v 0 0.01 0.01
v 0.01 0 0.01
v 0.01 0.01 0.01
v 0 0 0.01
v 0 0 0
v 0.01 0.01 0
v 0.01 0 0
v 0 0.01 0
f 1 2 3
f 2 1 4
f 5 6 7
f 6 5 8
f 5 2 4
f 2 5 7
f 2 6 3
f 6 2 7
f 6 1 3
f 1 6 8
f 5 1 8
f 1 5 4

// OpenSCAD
// file: ../../src/common/common_params.scad
/***
 * @module Common Parameters
 * @brief Shared constants and tolerances used by the CurveGears implementation.
 *
 * Historical constants are retained for numerical compatibility.
 */
_cg_pi = 3.14159;
_cg_deg_per_rad = 57.29578;
_cg_tolerance = 1e-7;
_cg_default_fn = 50;
_cg_circle_pi = 3.141592653589793;

/**
 * @module _cg_assert_samples
 * @brief Validate a sampled-curve count while preserving the caller diagnostic.
 * @param samples {integer >= minimum} Requested sample count.
 * @param message {string} Caller-specific diagnostic message.
 * @param minimum {integer, default 120} Minimum supported sample count.
 */
module _cg_assert_samples(samples,message="samples must be an integer >= 120",minimum=120) {
    assert(samples >= minimum && floor(samples)==samples,message);
}
// file: ../../src/common/mate/motion.scad
/***
 * @module Mate motion
 * @brief Shared phase interpolation for mathematically conjugate mates.
 *
 * Family files own radius and pitch-point equations. This file owns the
 * shared midpoint integration, closure solve, direct mate-point construction
 * and phase interpretation used by every dynamically conjugate family.
 *
 * The fixed-centre conjugate pitch relation is `r2=D-r1` with rolling law
 * `dphi/dtheta=r1/(D-r1)`. Shape-driven families provide `r1(theta)` or an
 * adapted closed pitch curve; a future motion-driven adapter may instead
 * derive both radii from a displacement law before entering this same core.
 * These equations define pitch geometry, not exact tooth-flank geometry.
 */
include <../common_math.scad>

/***
 * @function _cg_motion_values_from_mid_radii
 * @brief Integrate one revolution from midpoint radii at a candidate centre distance.
 * @param mid_radii {array} Driver radii sampled at integration midpoints.
 * @param D {number > 0} Candidate centre distance in mm.
 * @return {array} Incremental mate-angle values in degrees.
 */
function _cg_motion_values_from_mid_radii(mid_radii,D) =
    [for(i=[0:len(mid_radii)-1])
        let(step=360/len(mid_radii),r=mid_radii[i]) step*r/(D-r)];

/**
 * @function _cg_motion_integration_state
 * @brief Build the shared incremental values, cumulative angles and motion table once.
 * @param driver_radii {array of number} Driver radii at output angles, or `undef`.
 * @param mid_radii {array of number} Driver radii at interval midpoints.
 * @param D {number > 0} Centre distance in mm.
 * @return {array} `[values, cumulative, motion]` integration state.
 */
function _cg_motion_integration_state(driver_radii,mid_radii,D) =
    let(values=_cg_motion_values_from_mid_radii(mid_radii,D),cumulative=_cg_prefix_sums(values),n=is_undef(driver_radii) ? len(mid_radii) : len(driver_radii))
    [values,cumulative,[for(i=[0:n]) [360*i/n,cumulative[i]]]];

/***
 * @function _cg_motion_table_from_mid_radii
 * @brief Build a phase-to-phase motion table from midpoint radii.
 * @param mid_radii {array} Driver radii sampled at integration midpoints.
 * @param D {number > 0} Centre distance in mm.
 * @return {array} Table of `[driver phase, mate phase]` pairs in degrees.
 */
function _cg_motion_table_from_mid_radii(mid_radii,D) =
    _cg_motion_integration_state(undef,mid_radii,D)[2];

/***
 * @function _cg_motion_closure_error_from_mid_radii
 * @brief Return the one-turn closure error for midpoint-radius integration.
 * @param mid_radii {array} Driver radii sampled at integration midpoints.
 * @param D {number > 0} Candidate centre distance in mm.
 * @return {number} Closure error in degrees.
 */
function _cg_motion_closure_error_from_mid_radii(mid_radii,D) =
    let(state=_cg_motion_integration_state(undef,mid_radii,D)) state[1][len(state[1])-1]-360;

/**
 * @function _cg_motion_table_from_radius_samples
 * @brief Integrate the rolling law at driver-angle samples.
 * @param driver_radii {array of number} Driver radii at output angles.
 * @param mid_radii {array of number} Driver radii at interval midpoints.
 * @param D {number > 0} Centre distance in mm.
 * @return {array} Table of `[driver phase, mate phase]` pairs in degrees.
 *
 * The midpoint radii are used only for integration.  The table is therefore
 * an output of the direct driver-angle integration, not an inverse-motion
 * reconstruction of the mate.
 */
function _cg_motion_table_from_radius_samples(driver_radii,mid_radii,D) =
    _cg_motion_integration_state(driver_radii,mid_radii,D)[2];

/***
 * @function _cg_solve_mate_distance
 * @brief Solve the centre distance whose integrated mate motion closes after one turn.
 * @param mid_radii {array} Driver radii sampled at integration midpoints.
 * @param lo {number > 0} Lower centre-distance bracket in mm.
 * @param hi {number > 0} Upper centre-distance bracket in mm.
 * @param i {integer, default 0} Recursive bisection iteration.
 * @return {number} Solved centre distance in mm.
 */
function _cg_solve_mate_distance(mid_radii,lo,hi,i=0) =
    i>=36 ? (lo+hi)/2 :
    let(mid=(lo+hi)/2,e=_cg_motion_closure_error_from_mid_radii(mid_radii,mid))
        e>0 ? _cg_solve_mate_distance(mid_radii,mid,hi,i+1)
        : _cg_solve_mate_distance(mid_radii,lo,mid,i+1);

/**
 * @function _cg_mate_points_from_radius_samples
 * @brief Construct mate pitch points directly while advancing driver angle.
 * @param driver_radii {array of number} Driver radii at output angles.
 * @param mid_radii {array of number} Driver radii at interval midpoints.
 * @param D {number > 0} Centre distance in mm.
 * @return {array of points} Directly generated Cartesian mate pitch points.
 *
 * For each driver sample `theta_i`, the accumulated rolling angle `phi_i`
 * is evaluated first and the mate radius is then `D-driver_radii[i]`. Its
 * local polar angle is `-phi_i`; reversing the sampled order restores the
 * positive winding required by the gear-boundary construction.
 * This is the primary mate-construction path for all radial families.
 */
function _cg_mate_points_from_radius_samples(driver_radii,mid_radii,D) =
    _cg_mate_points_from_radius_samples_with_state(driver_radii,D,_cg_motion_integration_state(driver_radii,mid_radii,D));

/**
 * @function _cg_mate_points_from_radius_samples_with_state
 * @brief Construct mate points from a previously integrated motion state.
 * @param driver_radii {array of number} Driver radii at output angles.
 * @param D {number > 0} Centre distance in mm.
 * @param integration_state {array} State returned by `_cg_motion_integration_state`.
 * @return {array of points} Directly generated Cartesian mate pitch points.
 */
function _cg_mate_points_from_radius_samples_with_state(driver_radii,D,integration_state) =
    let(clockwise=[for(i=[0:len(driver_radii)-1])
        _cg_mate_point_from_radius(driver_radii[i],D,-integration_state[1][i])])
    [for(i=[0:len(clockwise)-1]) clockwise[(len(clockwise)-i)%len(clockwise)]];

/***
 * @function _cg_mate_point_from_radius
 * @brief Map a driver phase and evaluated driver radius to its opposed mate pitch point.
 * @param radius {number > 0} Driver radius in mm.
 * @param D {number > 0} Centre distance in mm.
 * @param phi {angle} Mate polar angle in degrees.
 * @return {array} Mate Cartesian pitch point in mm.
 */
function _cg_mate_point_from_radius(radius,D,phi) =
    let(mate_radius=D-radius)
    [mate_radius*cos(phi),mate_radius*sin(phi)];

/***
 * @function _cg_motion_y_unwrapped
 * @brief Return the continuous mate angle for a driver angle from a motion table.
 * @param tab {array} Table of `[driver phase, mate phase]` pairs.
 * @param angle {angle} Driver phase in degrees.
 * @return {angle} Continuous mate phase in degrees.
 */
function _cg_motion_y_unwrapped(tab,angle) =
    let(turns=floor(angle/360),wrapped=angle-360*turns)
    360*turns + _cg_interp_y_for_x(tab,wrapped);

/***
 * @function _cg_mate_rotation_for_phase
 * @brief Convert driver body rotation into the conjugate mate body rotation.
 * @param tab {array} Table of `[driver phase, mate phase]` pairs.
 * @param phase {angle} Driver phase in degrees.
 * @return {angle} Mate display rotation in degrees.
 */
function _cg_mate_rotation_for_phase(tab,phase) = 180 + _cg_motion_y_unwrapped(tab,-phase);

/**
 * @function _cg_motion_closure_error
 * @brief Return the final accumulated mate-angle error in degrees.
 * @param motion {motion table} Shared driver-to-mate motion table.
 * @return {number} Difference between the final mate angle and one turn.
 */
function _cg_motion_closure_error(motion) = motion[len(motion)-1][1]-360;
// file: ../../src/common/mate/preparation.scad
/***
 * @module Mate preparation
 * @brief Prepare conjugate pitch geometry from explicitly sampled physical radii.
 *
 * Families own their radius laws, sampling and distance bounds. This layer
 * composes the existing solver and integration once per invocation.
 */
include <motion.scad>

/**
 * @function _cg_mate_radii_valid
 * @brief Check finite positive physical radii without building geometry.
 * @param radii {array of number} Boundary or midpoint radii in millimetres.
 * @return {boolean} True for at least three finite positive radii.
 */
function _cg_mate_radii_valid(radii) = len(radii)>=3
    && min([for(r=radii) is_num(r) && r>0 && r<1e100 ? 1 : 0])==1;

/**
 * @function _cg_mate_distance_from_radii
 * @brief Solve the existing rolling equation after checking its physical bracket.
 * @param mid_radii {array of number} Physical radii at integration midpoints.
 * @param lower {number or function} Lower distance bound strictly above the midpoint radii.
 * @param upper {number} Upper distance bound enclosing one-turn closure.
 * @return {number} Solved centre distance in millimetres.
 */
function _cg_mate_distance_from_radii(mid_radii,lower,upper) =
    let(bound=is_function(lower) ? lower(mid_radii) : lower)
    assert(_cg_mate_radii_valid(mid_radii),"mate_preparation: midpoint radii must be finite and positive")
    assert(is_num(bound) && is_num(upper) && bound>max(mid_radii) && upper>bound && upper<1e100,
        "mate_preparation: distance bounds must be finite and outside the driver")
    assert(_cg_motion_closure_error_from_mid_radii(mid_radii,bound)>=0
        && _cg_motion_closure_error_from_mid_radii(mid_radii,upper)<=0,
        "mate_preparation: distance bounds must bracket one-turn closure")
    _cg_solve_mate_distance(mid_radii,bound,upper);

/**
 * @function _cg_mate_preparation
 * @brief Share distance, motion integration and conjugate pitch construction.
 * @param driver_radii {array of number} Radii at output angle boundaries.
 * @param mid_radii {array of number} Radii at the corresponding interval midpoints.
 * @param lower {number, function or undef} Family-selected lower solver bound.
 * @param upper {number or undef} Family-selected upper solver bound.
 * @param distance {number or undef} Optional already solved centre distance.
 * @return {array} `[distance, motion table, mate pitch points]`, consumed by shared geometry operators.
 */
function _cg_mate_preparation(driver_radii,mid_radii,lower=undef,upper=undef,distance=undef) =
    assert(len(driver_radii)==len(mid_radii) && _cg_mate_radii_valid(driver_radii) && _cg_mate_radii_valid(mid_radii),
        "mate_preparation: boundary and midpoint radii must be finite, positive and equally sized")
    let(D=is_undef(distance) ? _cg_mate_distance_from_radii(mid_radii,lower,upper) : distance)
    assert(is_num(D) && D<1e100 && D>max(concat(driver_radii,mid_radii)),
        "mate_preparation: centre distance must exceed all driver radii")
    let(state=_cg_motion_integration_state(driver_radii,mid_radii,D))
    [D,state[2],_cg_mate_points_from_radius_samples_with_state(driver_radii,D,state)];

/**
 * @function _cg_polar_mate_distance
 * @brief Solve one named shape's physical centre distance without building unused geometry.
 * @param shape {array} `[driver points, radius function, lower bound, upper bound, radial root]`.
 * @param n {integer >= 3} Number of motion intervals.
 * @return {number} Centre distance in millimetres.
 */
function _cg_polar_mate_distance(shape,n) =
    _cg_mate_distance_from_radii(_cg_sample_polar_radii(shape[1],n,true),shape[2],shape[3]);

/**
 * @function _cg_polar_mate_rotation
 * @brief Solve distance and integrated rolling motion for a named shape and phase.
 * @param shape {array} Physical shape and bound descriptor.
 * @param n {integer >= 3} Number of motion intervals.
 * @param phase {angle} Unwrapped driver phase in degrees.
 * @return {angle} Mate display rotation in degrees.
 */
function _cg_polar_mate_rotation(shape,n,phase) =
    let(mid=_cg_sample_polar_radii(shape[1],n,true),D=_cg_mate_distance_from_radii(mid,shape[2],shape[3]),motion=_cg_motion_table_from_mid_radii(mid,D))
    _cg_mate_rotation_for_phase(motion,phase);
// main file
/***
 * @function mate_preparation
 * @brief Prove rolling closure, complementary radii, tangent conjugacy and shared preparation consistency.
 * Source: [`mate/preparation.scad`](mate/preparation.scad)
 */
include <../../src/common/mate/preparation.scad>

n=240;
for(amplitude=[0,2]) {
    driver=[for(i=[0:n-1]) 10+amplitude*cos(360*i/n)];
    mid=[for(i=[0:n-1]) 10+amplitude*cos(360*(i+.5)/n)];
    prepared=_cg_mate_preparation(driver,mid,12.01,40);
    D=prepared[0];
    motion=prepared[1];
    mate=prepared[2];
    assert(abs(_cg_motion_closure_error(motion))<1e-6,"prepared rolling closure failed");
    assert(max([for(i=[0:n-1]) abs(driver[i]+sqrt(mate[(n-i)%n][0]*mate[(n-i)%n][0]+mate[(n-i)%n][1]*mate[(n-i)%n][1])-D)])<1e-10,
        "prepared complementary radius failed");
    for(i=[0:n-1])
        assert(abs(motion[i+1][1]-motion[i][1]-(360/n)*mid[i]/(D-mid[i]))<1e-10,"rolling increment changed");
    if(amplitude==0) {
        assert(abs(D-20)<1e-8,"circular analytic centre distance changed");
        for(phase=[-360,-15,0,15,43,90,180,270,359,360,735])
            assert(abs(_cg_mate_rotation_for_phase(motion,phase)-(180-phase))<1e-6,"circular multi-turn motion changed");
    }
    assert(_cg_mate_preparation(driver,mid,distance=D)[2]==mate,"pre-solved distance changed points");
}
function _cg_test_rotate_vector(vector,angle) =
    [vector[0]*cos(angle)-vector[1]*sin(angle),vector[0]*sin(angle)+vector[1]*cos(angle)];
function _cg_test_tangent_line_error(a,b) =
    atan2(abs(a[0]*b[1]-a[1]*b[0]),abs(a[0]*b[0]+a[1]*b[1]));

// An asymmetric radial law exercises the sign that a circle cannot expose.
asymmetric_n=240;
asymmetric_radii=[for(i=[0:asymmetric_n-1]) 10+2*sin(360*i/asymmetric_n)+.8*cos(720*i/asymmetric_n+20)];
asymmetric_mid=[for(i=[0:asymmetric_n-1]) 10+2*sin(360*(i+.5)/asymmetric_n)+.8*cos(720*(i+.5)/asymmetric_n+20)];
asymmetric_points=_cg_polar_points_from_radii(asymmetric_radii);
asymmetric_prepared=_cg_mate_preparation(asymmetric_radii,asymmetric_mid,max(asymmetric_mid)+.01,4*max(asymmetric_mid));
asymmetric_mate=asymmetric_prepared[2];
asymmetric_correspondence=[for(i=[0:asymmetric_n-1]) asymmetric_mate[(asymmetric_n-i)%asymmetric_n]];
asymmetric_motion=asymmetric_prepared[1];
asymmetric_tangent_errors=[for(i=[0:asymmetric_n-1])
    let(previous=(i-1+asymmetric_n)%asymmetric_n,next=(i+1)%asymmetric_n,theta=360*i/asymmetric_n,phi=asymmetric_motion[i][1],
        driver_tangent=_cg_test_rotate_vector(_cg_vsub(asymmetric_points[next],asymmetric_points[previous]),-theta),
        mate_tangent=_cg_test_rotate_vector(_cg_vsub(asymmetric_correspondence[next],asymmetric_correspondence[previous]),180+phi))
    _cg_test_tangent_line_error(driver_tangent,mate_tangent)];
assert(max(asymmetric_tangent_errors)<.1,"asymmetric mate pitch curves must remain tangent at every sampled contact");
for(i=[0:asymmetric_n-1])
    assert(abs(_cg_vlen(asymmetric_correspondence[i])+asymmetric_radii[i]-asymmetric_prepared[0])<1e-9,
        "asymmetric mate pitch radii must complement the driver at every sample");

cube(.01);
